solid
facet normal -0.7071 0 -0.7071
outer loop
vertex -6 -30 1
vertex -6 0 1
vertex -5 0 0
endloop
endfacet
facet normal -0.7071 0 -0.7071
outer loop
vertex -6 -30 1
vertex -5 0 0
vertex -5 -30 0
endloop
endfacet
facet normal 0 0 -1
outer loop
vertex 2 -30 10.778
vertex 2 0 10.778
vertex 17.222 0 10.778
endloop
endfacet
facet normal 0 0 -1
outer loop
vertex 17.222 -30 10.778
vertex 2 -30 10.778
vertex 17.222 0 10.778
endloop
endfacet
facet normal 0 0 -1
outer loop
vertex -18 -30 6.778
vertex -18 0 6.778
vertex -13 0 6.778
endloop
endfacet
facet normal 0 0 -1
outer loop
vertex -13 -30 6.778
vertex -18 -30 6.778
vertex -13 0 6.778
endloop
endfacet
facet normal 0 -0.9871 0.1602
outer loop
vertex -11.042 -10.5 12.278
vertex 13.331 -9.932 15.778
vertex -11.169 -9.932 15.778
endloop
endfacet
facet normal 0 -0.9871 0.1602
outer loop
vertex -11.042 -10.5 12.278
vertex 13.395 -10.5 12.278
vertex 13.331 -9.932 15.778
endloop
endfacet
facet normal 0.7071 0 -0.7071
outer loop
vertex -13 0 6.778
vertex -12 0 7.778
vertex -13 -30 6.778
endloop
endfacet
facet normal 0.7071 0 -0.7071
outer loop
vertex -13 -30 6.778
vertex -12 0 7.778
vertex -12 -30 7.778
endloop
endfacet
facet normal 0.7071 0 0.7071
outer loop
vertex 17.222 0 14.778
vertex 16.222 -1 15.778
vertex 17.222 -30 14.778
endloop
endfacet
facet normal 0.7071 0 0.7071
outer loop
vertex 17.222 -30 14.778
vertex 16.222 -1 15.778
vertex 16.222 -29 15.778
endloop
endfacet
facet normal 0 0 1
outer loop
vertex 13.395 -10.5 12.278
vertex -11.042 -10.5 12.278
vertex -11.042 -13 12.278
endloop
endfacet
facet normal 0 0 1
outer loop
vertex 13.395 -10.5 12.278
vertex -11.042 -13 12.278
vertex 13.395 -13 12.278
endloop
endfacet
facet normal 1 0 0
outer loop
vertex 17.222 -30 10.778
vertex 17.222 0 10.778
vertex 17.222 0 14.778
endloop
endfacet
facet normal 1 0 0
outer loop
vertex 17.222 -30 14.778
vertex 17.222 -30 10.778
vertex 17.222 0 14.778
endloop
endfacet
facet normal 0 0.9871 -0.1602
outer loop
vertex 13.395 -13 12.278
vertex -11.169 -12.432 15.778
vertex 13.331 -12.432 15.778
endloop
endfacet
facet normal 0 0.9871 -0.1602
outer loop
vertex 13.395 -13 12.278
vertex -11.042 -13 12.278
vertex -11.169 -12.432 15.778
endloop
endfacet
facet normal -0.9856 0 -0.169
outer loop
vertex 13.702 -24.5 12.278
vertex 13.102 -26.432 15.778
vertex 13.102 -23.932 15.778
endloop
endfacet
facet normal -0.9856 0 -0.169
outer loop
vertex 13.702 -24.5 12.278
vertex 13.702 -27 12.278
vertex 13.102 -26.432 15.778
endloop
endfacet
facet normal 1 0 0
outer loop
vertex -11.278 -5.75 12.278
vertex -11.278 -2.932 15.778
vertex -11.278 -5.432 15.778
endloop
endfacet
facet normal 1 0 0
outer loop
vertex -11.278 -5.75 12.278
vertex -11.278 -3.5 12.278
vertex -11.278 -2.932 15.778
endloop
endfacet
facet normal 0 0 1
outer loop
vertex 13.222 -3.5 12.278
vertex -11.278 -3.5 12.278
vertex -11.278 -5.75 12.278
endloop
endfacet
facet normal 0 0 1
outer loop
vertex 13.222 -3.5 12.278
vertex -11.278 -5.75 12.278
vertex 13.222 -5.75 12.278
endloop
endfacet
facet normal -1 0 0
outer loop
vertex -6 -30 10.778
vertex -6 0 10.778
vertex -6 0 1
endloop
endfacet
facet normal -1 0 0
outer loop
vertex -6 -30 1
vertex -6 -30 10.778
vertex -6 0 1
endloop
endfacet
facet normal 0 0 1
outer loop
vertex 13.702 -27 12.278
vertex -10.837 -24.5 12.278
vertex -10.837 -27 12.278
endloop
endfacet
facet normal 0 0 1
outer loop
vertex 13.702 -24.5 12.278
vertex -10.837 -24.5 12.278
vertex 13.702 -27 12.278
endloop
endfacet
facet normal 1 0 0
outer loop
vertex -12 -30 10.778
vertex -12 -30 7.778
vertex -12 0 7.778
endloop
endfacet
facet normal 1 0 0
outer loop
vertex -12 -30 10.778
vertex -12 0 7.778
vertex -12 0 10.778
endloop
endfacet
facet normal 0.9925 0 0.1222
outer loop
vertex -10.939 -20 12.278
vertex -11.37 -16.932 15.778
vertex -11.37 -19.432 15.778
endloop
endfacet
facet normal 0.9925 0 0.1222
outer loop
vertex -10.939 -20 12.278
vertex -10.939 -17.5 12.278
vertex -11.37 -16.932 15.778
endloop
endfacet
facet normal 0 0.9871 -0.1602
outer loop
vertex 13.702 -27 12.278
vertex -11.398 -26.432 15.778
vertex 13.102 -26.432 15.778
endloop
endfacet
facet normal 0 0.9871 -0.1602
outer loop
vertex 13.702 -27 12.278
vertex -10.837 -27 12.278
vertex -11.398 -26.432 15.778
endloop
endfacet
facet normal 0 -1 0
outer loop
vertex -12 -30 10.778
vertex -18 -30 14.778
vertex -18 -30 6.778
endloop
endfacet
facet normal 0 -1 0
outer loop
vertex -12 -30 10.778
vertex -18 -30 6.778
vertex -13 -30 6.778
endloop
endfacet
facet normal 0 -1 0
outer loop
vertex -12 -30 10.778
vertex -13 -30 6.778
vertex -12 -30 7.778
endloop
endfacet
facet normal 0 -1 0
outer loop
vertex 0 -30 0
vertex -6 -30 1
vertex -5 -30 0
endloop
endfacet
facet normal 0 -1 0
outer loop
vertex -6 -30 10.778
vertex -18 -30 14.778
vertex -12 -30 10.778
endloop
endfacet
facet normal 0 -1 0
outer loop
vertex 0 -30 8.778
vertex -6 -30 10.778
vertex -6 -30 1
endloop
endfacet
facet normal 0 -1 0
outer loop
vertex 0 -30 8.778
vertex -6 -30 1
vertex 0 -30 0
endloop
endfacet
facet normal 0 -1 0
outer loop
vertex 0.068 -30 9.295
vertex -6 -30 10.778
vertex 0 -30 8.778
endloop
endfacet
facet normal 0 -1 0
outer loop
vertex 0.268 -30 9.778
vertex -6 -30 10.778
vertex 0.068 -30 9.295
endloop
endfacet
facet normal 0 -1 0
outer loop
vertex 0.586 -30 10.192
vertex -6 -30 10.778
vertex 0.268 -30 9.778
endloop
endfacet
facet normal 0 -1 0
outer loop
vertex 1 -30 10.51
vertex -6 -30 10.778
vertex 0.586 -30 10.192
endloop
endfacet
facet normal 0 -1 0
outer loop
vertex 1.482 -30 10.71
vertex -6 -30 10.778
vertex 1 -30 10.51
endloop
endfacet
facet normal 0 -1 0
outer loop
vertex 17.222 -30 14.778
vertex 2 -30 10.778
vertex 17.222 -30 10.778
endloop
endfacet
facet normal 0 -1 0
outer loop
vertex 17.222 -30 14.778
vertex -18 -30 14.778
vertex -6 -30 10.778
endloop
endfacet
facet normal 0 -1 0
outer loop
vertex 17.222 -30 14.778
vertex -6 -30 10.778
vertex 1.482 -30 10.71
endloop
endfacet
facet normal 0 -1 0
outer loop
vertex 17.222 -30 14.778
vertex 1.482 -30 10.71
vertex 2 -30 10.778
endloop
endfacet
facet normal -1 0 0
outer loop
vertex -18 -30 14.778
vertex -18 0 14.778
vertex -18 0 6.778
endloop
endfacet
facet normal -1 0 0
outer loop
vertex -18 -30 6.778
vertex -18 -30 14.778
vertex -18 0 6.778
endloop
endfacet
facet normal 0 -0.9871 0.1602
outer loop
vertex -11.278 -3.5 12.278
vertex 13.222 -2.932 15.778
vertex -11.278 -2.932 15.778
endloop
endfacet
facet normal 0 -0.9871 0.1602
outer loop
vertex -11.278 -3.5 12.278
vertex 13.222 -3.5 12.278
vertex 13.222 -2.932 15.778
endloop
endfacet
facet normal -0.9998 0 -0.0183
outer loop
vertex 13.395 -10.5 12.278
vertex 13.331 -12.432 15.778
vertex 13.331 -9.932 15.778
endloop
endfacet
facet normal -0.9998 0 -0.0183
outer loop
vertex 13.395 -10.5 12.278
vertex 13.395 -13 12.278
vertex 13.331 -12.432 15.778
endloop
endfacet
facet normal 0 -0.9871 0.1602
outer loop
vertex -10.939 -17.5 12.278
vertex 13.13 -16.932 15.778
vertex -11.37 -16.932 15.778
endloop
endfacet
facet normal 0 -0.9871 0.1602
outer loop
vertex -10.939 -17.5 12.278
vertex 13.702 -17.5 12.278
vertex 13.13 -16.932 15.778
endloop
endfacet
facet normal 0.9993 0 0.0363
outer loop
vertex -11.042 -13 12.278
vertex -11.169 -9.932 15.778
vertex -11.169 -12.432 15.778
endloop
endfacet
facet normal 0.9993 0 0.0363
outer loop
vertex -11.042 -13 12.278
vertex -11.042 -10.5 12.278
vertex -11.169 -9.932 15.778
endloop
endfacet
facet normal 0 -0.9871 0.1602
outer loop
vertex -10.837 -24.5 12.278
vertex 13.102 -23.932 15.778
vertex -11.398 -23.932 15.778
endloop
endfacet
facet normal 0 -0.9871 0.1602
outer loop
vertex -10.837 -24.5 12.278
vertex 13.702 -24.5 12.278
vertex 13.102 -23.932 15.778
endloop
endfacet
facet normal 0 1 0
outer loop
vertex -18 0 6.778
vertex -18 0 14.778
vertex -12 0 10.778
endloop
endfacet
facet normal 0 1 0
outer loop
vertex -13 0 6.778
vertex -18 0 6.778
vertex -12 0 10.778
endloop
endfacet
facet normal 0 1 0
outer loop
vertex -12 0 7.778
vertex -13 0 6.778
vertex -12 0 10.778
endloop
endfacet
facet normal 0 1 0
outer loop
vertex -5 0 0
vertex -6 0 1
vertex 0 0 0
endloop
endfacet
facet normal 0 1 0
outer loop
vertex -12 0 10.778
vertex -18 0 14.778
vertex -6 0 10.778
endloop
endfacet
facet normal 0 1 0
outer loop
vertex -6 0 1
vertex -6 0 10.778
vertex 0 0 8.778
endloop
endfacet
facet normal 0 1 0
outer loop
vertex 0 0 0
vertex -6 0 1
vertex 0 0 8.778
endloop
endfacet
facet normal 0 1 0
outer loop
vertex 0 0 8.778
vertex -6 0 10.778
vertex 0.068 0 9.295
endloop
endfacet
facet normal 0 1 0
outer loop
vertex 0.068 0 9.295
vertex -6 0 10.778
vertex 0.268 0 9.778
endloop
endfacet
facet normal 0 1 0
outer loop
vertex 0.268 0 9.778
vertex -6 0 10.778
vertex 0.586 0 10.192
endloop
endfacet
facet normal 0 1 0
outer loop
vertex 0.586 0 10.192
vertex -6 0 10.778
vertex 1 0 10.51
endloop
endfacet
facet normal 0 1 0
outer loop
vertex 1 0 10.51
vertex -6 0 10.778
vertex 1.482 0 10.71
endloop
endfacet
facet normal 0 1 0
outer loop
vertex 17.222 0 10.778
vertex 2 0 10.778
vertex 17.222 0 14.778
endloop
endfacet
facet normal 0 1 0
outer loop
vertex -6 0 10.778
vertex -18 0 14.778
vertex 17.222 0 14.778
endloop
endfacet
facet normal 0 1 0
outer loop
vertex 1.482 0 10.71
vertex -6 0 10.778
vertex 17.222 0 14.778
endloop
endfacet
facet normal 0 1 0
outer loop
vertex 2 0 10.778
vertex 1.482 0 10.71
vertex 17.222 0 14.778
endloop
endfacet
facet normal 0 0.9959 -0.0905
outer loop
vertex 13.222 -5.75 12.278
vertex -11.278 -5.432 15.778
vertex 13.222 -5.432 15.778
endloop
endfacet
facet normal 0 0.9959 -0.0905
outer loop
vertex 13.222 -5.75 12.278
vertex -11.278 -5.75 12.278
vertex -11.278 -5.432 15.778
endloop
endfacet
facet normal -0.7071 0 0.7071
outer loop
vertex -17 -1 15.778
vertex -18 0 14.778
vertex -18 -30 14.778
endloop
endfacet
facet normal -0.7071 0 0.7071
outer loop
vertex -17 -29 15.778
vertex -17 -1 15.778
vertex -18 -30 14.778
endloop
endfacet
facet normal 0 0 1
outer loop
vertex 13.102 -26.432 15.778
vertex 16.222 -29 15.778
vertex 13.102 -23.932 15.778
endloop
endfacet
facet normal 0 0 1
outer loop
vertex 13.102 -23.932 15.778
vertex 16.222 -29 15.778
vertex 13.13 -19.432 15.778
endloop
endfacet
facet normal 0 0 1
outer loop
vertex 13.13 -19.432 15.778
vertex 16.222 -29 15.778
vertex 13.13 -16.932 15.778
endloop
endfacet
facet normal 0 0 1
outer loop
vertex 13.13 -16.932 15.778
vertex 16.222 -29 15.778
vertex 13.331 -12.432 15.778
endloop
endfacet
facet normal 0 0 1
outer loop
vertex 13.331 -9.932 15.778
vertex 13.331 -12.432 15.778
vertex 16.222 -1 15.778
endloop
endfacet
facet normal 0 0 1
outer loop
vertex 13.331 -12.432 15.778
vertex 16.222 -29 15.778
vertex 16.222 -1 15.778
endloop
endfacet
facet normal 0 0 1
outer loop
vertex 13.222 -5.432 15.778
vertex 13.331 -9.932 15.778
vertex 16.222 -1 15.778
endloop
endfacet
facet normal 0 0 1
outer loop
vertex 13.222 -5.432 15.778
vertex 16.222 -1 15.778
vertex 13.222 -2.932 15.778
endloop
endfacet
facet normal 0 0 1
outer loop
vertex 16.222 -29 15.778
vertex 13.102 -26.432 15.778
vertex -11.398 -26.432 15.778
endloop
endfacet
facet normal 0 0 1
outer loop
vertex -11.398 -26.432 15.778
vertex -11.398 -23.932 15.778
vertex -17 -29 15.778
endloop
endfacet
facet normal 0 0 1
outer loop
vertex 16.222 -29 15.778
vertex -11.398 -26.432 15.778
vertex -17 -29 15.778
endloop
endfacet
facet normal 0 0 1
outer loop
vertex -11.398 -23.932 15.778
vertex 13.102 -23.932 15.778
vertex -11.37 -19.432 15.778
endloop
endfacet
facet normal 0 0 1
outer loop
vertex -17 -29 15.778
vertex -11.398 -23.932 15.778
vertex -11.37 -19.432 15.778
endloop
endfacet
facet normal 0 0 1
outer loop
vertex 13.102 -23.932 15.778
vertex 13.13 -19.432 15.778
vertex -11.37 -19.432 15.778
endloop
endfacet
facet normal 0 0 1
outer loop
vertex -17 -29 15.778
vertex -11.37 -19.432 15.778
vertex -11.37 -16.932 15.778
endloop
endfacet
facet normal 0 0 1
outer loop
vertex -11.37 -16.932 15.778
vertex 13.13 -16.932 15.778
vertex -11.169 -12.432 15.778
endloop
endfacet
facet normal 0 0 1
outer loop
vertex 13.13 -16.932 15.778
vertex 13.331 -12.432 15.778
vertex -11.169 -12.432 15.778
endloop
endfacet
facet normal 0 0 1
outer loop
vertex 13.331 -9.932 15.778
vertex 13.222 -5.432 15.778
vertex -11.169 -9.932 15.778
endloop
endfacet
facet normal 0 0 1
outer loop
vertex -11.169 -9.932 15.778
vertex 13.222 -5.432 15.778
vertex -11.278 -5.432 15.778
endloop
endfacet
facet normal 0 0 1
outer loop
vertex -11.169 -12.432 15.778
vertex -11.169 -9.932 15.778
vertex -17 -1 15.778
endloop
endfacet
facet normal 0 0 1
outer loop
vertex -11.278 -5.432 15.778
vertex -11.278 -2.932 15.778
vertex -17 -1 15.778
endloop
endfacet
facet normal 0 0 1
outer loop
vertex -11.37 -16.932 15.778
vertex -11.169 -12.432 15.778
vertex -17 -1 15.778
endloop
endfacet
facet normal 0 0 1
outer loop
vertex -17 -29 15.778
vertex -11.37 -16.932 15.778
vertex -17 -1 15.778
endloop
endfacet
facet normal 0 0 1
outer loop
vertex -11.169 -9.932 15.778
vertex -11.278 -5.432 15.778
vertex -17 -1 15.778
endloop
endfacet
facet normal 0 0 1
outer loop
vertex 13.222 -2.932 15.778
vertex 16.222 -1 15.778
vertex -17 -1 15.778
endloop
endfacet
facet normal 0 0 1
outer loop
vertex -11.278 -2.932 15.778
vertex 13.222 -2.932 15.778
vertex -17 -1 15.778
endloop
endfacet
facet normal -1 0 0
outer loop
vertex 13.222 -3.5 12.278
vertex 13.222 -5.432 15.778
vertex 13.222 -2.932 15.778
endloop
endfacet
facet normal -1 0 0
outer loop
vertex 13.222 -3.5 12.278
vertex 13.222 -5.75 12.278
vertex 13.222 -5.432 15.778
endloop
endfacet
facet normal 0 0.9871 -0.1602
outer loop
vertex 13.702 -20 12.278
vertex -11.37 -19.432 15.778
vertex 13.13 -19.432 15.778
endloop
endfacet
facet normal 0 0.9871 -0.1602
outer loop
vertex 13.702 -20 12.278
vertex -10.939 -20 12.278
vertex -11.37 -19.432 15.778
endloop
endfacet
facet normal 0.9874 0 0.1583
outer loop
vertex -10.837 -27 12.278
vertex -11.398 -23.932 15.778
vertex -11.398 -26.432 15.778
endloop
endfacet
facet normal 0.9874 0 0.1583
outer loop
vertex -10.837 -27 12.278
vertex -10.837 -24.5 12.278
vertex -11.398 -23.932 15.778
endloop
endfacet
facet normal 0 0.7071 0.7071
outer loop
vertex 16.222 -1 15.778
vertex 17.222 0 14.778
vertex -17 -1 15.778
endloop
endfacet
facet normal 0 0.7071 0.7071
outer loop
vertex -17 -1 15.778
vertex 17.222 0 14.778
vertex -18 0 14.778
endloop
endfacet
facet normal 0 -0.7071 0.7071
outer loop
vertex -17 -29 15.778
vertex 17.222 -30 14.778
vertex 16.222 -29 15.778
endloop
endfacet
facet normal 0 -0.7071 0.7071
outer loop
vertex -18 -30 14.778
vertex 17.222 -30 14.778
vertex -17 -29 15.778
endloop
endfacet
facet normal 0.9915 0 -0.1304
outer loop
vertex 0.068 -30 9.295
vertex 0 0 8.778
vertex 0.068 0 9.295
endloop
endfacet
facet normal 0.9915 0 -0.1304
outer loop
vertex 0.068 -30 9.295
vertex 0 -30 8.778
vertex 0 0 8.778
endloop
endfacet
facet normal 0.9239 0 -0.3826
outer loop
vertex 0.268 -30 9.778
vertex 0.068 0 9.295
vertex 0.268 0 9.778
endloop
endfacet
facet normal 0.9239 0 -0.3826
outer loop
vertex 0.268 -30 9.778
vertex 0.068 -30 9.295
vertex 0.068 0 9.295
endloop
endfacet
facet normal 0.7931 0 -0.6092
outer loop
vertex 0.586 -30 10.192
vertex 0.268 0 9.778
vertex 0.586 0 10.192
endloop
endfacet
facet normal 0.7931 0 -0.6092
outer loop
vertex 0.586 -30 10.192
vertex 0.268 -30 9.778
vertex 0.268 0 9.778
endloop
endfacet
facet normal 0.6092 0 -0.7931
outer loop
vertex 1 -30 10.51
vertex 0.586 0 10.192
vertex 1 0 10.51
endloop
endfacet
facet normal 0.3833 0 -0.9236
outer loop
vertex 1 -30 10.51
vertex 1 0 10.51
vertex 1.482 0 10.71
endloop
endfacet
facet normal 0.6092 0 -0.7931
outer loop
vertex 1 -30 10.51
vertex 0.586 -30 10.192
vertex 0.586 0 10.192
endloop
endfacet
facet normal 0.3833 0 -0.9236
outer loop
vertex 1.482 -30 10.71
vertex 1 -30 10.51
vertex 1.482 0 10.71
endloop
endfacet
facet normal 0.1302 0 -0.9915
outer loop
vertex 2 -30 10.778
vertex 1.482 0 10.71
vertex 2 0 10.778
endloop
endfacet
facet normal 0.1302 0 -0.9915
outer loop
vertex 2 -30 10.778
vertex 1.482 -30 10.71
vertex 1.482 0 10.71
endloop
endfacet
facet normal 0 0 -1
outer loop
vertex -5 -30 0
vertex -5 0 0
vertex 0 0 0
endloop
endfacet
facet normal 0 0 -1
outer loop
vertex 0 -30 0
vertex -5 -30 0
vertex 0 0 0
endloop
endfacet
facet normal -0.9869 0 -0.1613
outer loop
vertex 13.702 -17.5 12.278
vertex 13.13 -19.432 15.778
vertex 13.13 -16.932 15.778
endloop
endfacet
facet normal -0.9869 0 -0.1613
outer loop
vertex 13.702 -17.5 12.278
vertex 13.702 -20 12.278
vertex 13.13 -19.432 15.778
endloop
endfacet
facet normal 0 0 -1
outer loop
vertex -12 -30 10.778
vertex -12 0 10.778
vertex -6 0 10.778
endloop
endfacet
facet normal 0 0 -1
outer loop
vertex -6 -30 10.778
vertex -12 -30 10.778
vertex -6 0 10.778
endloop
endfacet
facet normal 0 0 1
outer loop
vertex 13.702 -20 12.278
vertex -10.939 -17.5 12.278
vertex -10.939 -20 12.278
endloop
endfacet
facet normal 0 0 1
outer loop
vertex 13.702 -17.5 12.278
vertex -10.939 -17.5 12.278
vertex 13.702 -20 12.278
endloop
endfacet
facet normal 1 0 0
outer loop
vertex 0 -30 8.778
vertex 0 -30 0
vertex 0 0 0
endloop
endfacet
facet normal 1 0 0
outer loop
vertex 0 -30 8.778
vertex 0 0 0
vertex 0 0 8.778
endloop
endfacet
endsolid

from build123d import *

# Parameters (mm, degrees)
F1_DEPTH = 30
F2_SIZE  = 1
F3_R     = 2
F4_W     = 24.5
F4_H     = 2.5
F6_W     = 24.5389966294
F6_H     = 2.5
F6_W_2   = 24.6412428096
F6_W_3   = 24.4367551059
F6_W_4   = 24.5
F6_H_2   = 2.25


with BuildPart() as f1:
    # F0 (on Front) → F1 (new body)
    with BuildSketch(Plane.XZ):
        Polygon((-6, 0), (0, 0), (0, 10.7777772923), (17.2222208352, 10.7777772923), (17.2222208352, 15.7777772923), (4.666664066, 15.7777772923), (-18, 15.7777772923), (-18, 6.7777772923), (-12, 6.7777772923), (-12, 10.7777772923), (-6, 10.7777772923), align=None)
    extrude(amount=F1_DEPTH)

    # F2
    f2_edges = [f1.edges().sort_by_distance(p)[0] for p in [
        (-0.38889, -30, 15.777777),
        (17.222221, -15, 15.777777),
        (-0.38889, 0, 15.777777),
        (-18, -15, 15.777777),
        (-12, -15, 6.777777),
        (-6, -15, 0),
    ]]
    chamfer(f2_edges, length=F2_SIZE)

    # F3
    f3_edges = [f1.edges().sort_by_distance(p)[0] for p in [
        (0, -15, 10.777777),
    ]]
    fillet(f3_edges, radius=F3_R)

    # F4 (on face) → F7 section 0
    with BuildSketch(Plane.XY.offset(15.7777772923)):
        with Locations((0.8522442952, -25.1817190625)):
            Rectangle(F4_W, F4_H)
    # F6 (on offset) → F7 section 1
    with BuildSketch(Plane.XY.offset(12.2777772923)):
        with Locations((1.4323252253, -25.75)):
            Rectangle(F6_W, F6_H)
    loft(mode=Mode.SUBTRACT)

    # F4 (on face) → F8 section 0
    with BuildSketch(Plane.XY.offset(15.7777772923)):
        with Locations((0.8801504448, -18.1817190625)):
            Rectangle(F4_W, F4_H)
    # F6 (on offset) → F8 section 1
    with BuildSketch(Plane.XY.offset(12.2777772923)):
        with Locations((1.3812021352, -18.75)):
            Rectangle(F6_W_2, F6_H)
    loft(mode=Mode.SUBTRACT)

    # F4 (on face) → F9 section 0
    with BuildSketch(Plane.XY.offset(15.7777772923)):
        with Locations((1.0807377696, -11.1817190625)):
            Rectangle(F4_W, F4_H)
    # F6 (on offset) → F9 section 1
    with BuildSketch(Plane.XY.offset(12.2777772923)):
        with Locations((1.1767121032, -11.75)):
            Rectangle(F6_W_3, F6_H)
    loft(mode=Mode.SUBTRACT)

    # F4 (on face) → F10 section 0
    with BuildSketch(Plane.XY.offset(15.7777772923)):
        with Locations((0.9722208352, -4.1817190625)):
            Rectangle(F4_W, F4_H)
    # F6 (on offset) → F10 section 1
    with BuildSketch(Plane.XY.offset(12.2777772923)):
        with Locations((0.9722208352, -4.625)):
            Rectangle(F6_W_4, F6_H_2)
    loft(mode=Mode.SUBTRACT)


solid = f1.part
